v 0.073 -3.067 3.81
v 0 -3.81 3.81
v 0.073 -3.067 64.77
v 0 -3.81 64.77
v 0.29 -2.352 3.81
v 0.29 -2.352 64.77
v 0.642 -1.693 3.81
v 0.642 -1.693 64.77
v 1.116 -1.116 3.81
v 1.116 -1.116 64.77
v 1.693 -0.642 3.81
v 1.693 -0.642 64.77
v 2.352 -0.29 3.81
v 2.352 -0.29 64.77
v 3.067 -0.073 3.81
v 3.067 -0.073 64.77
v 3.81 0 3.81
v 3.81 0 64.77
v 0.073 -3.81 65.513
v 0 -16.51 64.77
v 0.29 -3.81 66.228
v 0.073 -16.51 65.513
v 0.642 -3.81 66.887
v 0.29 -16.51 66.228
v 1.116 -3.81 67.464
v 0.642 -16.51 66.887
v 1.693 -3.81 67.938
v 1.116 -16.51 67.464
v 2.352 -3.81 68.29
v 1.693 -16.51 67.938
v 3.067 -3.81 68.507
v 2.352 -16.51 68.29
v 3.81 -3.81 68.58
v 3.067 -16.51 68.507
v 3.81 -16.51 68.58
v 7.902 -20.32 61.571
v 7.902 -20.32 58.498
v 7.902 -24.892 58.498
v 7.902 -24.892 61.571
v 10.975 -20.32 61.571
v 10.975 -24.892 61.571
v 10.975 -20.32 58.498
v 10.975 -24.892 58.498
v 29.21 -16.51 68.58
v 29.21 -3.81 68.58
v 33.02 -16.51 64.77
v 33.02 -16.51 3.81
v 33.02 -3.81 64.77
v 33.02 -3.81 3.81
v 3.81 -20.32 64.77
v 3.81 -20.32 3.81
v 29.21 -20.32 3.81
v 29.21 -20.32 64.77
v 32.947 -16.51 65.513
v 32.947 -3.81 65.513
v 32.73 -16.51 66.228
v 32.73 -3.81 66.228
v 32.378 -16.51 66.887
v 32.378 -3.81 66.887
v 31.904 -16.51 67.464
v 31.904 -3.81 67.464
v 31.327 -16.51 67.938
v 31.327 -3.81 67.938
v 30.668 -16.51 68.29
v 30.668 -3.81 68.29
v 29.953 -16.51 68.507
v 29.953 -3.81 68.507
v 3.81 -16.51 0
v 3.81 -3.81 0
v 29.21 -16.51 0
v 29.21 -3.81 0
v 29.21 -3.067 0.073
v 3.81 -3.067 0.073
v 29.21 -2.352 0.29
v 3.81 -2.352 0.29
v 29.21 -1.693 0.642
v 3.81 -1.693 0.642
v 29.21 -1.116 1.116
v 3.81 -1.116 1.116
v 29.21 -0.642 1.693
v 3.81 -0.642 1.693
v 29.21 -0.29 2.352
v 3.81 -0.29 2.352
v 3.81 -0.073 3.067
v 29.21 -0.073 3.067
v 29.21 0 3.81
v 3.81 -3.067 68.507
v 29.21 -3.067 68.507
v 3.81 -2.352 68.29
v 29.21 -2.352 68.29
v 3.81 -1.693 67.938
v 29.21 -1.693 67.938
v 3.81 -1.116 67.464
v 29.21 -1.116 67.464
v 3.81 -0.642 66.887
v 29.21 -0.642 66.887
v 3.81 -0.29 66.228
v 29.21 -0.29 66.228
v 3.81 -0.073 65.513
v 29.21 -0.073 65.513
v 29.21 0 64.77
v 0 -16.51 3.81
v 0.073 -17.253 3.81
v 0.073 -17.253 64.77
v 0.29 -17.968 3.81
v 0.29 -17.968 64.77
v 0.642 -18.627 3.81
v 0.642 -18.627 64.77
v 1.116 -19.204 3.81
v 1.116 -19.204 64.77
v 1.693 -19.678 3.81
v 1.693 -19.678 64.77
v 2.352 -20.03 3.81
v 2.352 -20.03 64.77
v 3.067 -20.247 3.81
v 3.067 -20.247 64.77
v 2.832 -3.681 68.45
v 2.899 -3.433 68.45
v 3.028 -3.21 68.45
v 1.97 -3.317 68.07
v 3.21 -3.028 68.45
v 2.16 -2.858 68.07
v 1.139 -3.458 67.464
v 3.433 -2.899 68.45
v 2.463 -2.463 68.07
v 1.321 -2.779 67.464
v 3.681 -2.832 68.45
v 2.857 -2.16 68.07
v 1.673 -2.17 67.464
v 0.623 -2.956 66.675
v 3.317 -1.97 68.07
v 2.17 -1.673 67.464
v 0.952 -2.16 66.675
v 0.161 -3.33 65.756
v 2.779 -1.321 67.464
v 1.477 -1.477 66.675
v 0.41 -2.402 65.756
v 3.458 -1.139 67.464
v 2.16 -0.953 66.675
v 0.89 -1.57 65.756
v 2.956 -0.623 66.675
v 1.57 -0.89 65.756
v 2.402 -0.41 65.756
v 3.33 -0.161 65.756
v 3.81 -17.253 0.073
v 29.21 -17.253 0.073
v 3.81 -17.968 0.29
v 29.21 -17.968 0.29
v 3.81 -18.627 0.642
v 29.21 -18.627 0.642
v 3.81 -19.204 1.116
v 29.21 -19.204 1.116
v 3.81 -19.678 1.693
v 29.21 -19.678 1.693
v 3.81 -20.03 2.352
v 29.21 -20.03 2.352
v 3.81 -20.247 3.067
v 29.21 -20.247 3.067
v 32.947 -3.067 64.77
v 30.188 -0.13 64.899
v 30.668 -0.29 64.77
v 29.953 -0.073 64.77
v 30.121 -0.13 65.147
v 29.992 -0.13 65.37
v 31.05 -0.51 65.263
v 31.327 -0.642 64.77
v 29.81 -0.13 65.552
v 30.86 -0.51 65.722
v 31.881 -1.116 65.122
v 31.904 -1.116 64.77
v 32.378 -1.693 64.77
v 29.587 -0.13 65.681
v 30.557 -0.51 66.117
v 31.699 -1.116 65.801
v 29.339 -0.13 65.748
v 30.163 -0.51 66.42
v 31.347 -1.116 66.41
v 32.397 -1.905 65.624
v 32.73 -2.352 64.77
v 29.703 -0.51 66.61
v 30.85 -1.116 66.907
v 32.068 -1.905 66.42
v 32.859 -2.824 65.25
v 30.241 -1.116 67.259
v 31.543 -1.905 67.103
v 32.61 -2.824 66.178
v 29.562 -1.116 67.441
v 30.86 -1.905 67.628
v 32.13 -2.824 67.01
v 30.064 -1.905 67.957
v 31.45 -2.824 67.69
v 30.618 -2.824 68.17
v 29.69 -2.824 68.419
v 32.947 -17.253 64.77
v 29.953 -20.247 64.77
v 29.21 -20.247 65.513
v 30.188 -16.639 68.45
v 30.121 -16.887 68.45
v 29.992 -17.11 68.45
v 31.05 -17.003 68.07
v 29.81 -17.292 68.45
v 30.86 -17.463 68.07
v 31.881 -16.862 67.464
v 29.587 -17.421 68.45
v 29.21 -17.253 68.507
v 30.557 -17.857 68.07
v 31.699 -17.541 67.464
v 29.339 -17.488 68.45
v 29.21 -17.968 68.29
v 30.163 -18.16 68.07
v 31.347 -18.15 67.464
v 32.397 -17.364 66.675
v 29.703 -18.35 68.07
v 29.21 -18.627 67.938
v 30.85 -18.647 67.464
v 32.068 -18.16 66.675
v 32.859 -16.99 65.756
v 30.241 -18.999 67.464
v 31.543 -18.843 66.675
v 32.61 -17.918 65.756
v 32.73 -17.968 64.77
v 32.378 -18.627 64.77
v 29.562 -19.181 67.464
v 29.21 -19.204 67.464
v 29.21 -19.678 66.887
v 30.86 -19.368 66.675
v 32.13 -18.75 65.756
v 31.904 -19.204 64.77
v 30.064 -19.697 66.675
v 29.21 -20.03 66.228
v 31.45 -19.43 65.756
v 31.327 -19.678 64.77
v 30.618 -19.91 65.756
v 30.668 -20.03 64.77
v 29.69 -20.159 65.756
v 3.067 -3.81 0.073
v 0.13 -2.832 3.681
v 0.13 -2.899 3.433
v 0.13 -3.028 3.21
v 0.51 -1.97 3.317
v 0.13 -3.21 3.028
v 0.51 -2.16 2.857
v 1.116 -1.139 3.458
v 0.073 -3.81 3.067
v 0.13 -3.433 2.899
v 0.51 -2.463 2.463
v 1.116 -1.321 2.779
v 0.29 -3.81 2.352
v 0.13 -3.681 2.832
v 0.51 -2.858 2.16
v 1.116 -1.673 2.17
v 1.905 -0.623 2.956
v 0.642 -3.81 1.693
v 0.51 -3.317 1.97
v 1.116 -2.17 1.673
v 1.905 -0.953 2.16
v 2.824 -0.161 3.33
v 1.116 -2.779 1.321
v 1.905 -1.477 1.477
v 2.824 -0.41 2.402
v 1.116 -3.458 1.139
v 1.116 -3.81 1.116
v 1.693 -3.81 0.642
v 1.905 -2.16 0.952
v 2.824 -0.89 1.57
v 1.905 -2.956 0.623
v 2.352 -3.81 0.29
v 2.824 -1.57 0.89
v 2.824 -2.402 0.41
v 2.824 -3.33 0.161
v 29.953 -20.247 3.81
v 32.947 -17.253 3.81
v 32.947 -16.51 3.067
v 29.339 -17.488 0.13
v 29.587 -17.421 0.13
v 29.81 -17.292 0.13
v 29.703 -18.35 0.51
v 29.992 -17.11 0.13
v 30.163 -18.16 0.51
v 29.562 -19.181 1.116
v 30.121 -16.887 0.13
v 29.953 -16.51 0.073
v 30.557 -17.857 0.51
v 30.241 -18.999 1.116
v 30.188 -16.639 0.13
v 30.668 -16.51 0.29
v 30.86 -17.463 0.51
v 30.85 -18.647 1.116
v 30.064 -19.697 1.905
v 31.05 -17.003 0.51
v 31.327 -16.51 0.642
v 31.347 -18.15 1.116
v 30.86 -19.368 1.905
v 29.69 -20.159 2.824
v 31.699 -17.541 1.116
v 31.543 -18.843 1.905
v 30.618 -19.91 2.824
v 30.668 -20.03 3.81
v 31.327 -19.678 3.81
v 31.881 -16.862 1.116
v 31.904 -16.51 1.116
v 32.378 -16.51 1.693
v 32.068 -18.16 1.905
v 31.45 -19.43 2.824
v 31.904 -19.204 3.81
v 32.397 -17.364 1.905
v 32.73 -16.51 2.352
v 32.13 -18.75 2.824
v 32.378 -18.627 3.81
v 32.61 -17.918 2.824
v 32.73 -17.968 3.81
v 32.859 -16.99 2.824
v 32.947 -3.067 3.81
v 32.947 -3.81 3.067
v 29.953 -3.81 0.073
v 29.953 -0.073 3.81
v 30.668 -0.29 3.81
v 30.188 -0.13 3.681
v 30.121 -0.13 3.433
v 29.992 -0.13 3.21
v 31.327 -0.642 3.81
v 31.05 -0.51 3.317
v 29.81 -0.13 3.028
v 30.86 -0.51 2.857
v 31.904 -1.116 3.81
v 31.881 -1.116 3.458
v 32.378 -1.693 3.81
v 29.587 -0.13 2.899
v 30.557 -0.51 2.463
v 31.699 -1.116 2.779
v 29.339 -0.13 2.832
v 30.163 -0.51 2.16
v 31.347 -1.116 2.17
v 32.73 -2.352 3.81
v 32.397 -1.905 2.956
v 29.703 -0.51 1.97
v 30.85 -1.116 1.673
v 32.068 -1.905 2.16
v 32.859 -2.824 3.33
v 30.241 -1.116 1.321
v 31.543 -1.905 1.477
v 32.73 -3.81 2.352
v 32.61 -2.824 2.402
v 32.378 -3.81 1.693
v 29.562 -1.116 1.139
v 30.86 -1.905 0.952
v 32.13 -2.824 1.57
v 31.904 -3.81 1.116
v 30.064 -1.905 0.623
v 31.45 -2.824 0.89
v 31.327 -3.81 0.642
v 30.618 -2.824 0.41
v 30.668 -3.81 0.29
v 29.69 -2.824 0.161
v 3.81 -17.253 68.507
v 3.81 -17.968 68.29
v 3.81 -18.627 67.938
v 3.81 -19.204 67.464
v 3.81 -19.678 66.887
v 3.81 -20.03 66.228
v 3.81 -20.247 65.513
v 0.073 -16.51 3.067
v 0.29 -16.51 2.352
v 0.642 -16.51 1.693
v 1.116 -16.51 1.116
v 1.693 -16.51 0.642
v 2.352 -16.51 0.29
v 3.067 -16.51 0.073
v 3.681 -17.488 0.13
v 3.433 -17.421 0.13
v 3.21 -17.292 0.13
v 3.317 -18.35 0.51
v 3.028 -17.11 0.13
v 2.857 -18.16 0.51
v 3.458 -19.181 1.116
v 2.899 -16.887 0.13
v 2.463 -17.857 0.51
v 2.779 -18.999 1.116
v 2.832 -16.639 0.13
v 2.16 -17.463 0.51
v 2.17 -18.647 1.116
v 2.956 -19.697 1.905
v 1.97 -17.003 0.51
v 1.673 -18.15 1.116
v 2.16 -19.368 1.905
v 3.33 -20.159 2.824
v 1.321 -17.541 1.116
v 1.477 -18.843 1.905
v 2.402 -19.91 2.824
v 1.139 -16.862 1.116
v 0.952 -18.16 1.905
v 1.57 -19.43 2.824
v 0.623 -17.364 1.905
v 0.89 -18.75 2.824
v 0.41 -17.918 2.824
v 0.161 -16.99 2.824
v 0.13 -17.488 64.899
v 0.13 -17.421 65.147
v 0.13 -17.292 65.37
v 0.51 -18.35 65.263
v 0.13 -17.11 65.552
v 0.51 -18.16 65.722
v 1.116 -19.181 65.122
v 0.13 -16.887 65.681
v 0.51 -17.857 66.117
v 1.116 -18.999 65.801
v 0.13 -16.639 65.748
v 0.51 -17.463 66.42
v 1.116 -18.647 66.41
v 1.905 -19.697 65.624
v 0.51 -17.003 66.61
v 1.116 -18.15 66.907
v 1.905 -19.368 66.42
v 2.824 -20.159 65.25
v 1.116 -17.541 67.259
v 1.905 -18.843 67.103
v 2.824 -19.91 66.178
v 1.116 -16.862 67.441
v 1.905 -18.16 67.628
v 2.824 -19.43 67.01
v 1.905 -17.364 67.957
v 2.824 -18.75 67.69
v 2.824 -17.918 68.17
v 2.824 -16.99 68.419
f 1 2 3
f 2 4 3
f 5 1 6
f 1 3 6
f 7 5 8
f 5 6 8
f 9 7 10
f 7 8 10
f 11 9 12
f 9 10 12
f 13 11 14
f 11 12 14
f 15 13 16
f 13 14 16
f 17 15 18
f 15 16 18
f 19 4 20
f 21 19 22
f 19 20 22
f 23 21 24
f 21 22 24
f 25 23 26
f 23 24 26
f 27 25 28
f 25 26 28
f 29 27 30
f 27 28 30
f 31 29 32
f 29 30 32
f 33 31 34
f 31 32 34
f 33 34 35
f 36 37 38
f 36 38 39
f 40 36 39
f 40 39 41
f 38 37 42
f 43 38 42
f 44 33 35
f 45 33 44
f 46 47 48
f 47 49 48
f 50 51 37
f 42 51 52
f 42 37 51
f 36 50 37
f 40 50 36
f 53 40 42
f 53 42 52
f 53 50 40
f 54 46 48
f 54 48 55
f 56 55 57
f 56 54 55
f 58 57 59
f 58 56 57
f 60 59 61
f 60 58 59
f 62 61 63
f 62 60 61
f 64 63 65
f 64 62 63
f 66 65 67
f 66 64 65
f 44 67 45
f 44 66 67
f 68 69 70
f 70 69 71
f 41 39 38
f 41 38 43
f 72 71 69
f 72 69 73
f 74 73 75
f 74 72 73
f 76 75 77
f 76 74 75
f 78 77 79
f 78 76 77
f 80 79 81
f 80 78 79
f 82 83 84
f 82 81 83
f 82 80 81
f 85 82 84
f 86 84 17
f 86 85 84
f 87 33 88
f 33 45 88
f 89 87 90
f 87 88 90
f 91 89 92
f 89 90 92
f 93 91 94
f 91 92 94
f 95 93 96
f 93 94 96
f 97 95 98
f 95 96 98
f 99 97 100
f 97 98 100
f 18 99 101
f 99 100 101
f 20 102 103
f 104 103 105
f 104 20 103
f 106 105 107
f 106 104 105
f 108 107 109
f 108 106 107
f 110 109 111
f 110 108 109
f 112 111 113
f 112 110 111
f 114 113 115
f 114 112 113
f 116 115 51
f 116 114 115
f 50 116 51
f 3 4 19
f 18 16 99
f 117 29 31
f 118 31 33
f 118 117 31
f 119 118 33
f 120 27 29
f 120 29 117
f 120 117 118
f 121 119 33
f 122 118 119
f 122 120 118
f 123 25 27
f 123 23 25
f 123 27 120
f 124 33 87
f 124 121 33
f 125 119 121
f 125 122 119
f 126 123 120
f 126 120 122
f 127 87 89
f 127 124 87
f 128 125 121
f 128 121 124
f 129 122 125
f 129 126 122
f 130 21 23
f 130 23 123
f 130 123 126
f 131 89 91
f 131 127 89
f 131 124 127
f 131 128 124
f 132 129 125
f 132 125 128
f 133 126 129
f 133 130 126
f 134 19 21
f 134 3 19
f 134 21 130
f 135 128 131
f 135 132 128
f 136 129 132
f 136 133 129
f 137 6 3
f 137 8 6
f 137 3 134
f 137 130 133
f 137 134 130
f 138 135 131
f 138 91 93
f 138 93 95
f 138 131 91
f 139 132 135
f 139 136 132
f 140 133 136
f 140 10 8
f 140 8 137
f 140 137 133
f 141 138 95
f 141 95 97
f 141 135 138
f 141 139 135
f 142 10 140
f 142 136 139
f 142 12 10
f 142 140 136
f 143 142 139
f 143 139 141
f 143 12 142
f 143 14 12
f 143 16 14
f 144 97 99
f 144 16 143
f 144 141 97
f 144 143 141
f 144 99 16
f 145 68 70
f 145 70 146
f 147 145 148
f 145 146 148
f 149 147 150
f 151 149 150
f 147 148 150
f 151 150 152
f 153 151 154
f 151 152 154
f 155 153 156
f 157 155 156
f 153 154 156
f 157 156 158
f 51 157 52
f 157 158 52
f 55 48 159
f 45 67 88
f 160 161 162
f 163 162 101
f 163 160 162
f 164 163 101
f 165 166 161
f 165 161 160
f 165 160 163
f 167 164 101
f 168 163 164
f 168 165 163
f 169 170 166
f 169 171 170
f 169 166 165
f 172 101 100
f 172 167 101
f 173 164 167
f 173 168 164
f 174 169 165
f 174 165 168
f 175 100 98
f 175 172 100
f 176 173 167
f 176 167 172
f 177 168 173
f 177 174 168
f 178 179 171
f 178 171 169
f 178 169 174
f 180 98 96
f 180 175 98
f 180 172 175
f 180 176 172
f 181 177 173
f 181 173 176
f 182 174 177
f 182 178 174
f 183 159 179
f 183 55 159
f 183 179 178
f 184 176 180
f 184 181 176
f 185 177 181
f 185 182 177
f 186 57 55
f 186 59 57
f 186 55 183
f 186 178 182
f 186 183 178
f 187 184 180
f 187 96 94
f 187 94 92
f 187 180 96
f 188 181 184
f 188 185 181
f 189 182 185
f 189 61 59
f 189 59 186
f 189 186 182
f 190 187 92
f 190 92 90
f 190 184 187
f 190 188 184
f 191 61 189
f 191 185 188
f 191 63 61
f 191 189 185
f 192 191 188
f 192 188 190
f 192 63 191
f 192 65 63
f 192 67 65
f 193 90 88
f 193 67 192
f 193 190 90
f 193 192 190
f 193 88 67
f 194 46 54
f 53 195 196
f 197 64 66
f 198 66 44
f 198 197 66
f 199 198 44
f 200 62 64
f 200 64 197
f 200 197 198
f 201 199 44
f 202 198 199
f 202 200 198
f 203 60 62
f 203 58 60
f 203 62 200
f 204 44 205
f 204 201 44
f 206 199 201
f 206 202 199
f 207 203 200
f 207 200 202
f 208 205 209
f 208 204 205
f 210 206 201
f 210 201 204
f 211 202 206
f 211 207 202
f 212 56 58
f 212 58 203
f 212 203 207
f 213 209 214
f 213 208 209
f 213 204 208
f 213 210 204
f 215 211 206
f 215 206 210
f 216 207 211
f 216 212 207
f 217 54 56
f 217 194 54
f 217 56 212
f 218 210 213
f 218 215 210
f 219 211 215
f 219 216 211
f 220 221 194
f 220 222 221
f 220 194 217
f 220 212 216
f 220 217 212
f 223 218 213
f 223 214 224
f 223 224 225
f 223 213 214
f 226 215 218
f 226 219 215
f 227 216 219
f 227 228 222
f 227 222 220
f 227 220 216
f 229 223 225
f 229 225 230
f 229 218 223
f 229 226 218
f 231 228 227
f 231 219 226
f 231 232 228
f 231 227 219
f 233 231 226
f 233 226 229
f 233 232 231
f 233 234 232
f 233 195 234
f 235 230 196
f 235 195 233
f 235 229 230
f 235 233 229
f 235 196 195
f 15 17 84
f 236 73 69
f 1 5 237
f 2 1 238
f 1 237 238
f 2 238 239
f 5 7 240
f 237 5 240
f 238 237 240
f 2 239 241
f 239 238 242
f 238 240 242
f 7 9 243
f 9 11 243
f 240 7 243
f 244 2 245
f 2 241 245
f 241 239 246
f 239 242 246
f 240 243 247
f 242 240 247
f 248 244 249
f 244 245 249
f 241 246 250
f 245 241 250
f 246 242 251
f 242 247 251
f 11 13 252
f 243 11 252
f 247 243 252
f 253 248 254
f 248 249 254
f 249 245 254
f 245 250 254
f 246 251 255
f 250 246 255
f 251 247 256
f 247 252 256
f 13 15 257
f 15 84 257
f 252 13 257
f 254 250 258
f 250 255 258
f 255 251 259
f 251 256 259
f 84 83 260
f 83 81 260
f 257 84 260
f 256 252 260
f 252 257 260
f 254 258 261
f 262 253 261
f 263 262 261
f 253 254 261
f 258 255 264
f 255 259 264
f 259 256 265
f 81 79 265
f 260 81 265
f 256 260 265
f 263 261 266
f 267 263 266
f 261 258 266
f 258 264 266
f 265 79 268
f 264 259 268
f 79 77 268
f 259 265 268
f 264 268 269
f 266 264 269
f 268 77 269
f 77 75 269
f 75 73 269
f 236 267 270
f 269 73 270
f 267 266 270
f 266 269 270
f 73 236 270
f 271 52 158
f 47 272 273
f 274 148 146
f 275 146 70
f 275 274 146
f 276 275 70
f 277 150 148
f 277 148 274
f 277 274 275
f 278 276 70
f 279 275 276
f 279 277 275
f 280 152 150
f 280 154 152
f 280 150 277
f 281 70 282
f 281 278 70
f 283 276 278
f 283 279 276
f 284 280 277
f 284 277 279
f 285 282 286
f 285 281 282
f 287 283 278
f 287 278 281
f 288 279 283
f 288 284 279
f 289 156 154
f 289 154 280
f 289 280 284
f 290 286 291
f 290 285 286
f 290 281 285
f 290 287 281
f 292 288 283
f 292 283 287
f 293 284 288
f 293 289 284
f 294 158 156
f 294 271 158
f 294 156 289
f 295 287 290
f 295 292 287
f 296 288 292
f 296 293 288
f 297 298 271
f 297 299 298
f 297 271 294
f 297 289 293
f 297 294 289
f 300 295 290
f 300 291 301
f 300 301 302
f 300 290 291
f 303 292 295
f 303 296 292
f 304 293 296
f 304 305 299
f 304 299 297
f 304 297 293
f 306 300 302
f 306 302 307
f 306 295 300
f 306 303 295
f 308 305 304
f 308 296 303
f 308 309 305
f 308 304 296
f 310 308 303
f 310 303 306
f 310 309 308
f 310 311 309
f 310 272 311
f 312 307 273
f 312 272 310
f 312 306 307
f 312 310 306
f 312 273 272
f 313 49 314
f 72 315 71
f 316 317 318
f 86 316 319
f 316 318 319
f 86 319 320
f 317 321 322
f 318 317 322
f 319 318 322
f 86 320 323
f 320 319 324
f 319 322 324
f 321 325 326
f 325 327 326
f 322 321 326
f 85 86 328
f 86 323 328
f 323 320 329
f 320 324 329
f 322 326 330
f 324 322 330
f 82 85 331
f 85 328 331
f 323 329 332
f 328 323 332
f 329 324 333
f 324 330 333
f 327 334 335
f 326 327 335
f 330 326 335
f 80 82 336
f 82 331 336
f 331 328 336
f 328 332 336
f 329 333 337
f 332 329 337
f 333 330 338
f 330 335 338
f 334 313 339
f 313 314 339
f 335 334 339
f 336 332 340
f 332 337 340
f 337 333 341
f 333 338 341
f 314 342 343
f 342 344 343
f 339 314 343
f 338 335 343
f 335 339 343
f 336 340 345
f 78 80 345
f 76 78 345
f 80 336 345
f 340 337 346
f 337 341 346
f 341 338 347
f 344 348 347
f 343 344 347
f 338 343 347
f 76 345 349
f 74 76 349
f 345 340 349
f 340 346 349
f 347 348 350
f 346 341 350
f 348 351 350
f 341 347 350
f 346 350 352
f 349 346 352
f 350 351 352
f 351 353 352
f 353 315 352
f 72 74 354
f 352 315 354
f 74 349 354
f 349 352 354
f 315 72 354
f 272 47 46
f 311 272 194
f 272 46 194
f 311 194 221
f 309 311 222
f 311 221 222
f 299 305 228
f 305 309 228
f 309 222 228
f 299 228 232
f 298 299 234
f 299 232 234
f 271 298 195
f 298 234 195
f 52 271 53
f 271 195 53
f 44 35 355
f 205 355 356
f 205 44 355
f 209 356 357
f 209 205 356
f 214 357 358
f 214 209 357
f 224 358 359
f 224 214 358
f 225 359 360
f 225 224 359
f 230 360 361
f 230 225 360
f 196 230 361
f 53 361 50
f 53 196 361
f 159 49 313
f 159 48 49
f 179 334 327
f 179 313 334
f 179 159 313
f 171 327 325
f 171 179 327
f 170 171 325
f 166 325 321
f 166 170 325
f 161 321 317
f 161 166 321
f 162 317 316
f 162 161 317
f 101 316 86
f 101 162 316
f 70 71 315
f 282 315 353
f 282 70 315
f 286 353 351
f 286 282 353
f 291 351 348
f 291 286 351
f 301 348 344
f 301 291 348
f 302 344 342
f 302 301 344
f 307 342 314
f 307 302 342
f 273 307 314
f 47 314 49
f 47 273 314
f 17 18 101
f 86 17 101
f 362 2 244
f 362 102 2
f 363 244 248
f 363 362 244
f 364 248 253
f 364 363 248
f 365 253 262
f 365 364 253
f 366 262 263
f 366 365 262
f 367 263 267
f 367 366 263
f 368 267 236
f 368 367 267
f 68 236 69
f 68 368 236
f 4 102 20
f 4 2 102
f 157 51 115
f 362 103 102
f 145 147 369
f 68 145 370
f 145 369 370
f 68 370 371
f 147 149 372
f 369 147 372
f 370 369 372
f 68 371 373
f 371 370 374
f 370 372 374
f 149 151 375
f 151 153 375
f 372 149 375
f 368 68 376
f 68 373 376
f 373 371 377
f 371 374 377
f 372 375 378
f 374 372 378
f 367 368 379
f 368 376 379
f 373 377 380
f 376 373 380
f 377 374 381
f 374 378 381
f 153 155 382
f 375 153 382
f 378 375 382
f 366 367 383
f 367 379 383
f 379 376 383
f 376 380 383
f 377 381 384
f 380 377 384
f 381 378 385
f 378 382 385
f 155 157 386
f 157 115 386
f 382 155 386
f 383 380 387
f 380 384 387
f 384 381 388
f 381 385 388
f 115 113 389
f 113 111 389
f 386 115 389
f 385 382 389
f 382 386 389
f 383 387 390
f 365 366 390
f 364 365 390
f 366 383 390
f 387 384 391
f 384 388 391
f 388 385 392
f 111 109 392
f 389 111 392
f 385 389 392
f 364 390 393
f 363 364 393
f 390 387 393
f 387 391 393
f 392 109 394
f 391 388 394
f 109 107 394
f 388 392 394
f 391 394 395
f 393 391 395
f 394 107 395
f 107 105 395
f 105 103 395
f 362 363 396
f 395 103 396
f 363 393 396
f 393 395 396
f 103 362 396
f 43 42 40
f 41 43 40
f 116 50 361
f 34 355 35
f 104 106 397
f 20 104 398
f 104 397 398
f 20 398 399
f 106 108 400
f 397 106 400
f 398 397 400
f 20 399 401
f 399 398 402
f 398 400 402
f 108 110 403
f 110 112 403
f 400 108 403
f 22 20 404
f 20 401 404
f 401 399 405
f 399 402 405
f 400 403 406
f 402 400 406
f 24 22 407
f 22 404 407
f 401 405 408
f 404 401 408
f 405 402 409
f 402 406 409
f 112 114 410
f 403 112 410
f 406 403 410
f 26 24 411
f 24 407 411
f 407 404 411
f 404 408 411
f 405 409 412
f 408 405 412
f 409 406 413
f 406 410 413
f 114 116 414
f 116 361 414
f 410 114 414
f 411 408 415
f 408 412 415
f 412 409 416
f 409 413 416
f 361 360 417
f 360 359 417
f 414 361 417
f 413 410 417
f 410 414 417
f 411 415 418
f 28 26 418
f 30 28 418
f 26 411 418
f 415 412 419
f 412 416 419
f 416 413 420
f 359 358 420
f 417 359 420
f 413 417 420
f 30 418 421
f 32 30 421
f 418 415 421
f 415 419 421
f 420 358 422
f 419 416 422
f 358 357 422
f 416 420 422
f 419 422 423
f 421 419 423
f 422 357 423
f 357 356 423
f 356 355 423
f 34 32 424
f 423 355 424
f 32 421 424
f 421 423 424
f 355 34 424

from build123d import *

# Parameters (mm, degrees)
F0_W     = 33.02
F0_H     = 68.58
F1_DEPTH = 20.32
F2_R     = 3.81
F3_W     = 3.073085
F3_H     = 3.073089
F4_DEPTH = 4.572


with BuildPart() as f1:
    # F0 (on Front) → F1 (new body)
    with BuildSketch(Plane.XZ):
        with Locations((16.51, 34.29)):
            Rectangle(F0_W, F0_H)
    extrude(amount=F1_DEPTH)

    # F2
    f2_edges = [f1.edges().sort_by_distance(p)[0] for p in [
        (33.02, -20.32, 34.29),
        (33.02, -10.16, 68.58),
        (16.51, -20.32, 68.58),
        (0, -20.32, 34.29),
        (16.51, -20.32, 0),
        (33.02, -10.16, 0),
        (33.02, 0, 34.29),
        (16.51, 0, 0),
        (0, 0, 34.29),
        (0, -10.16, 68.58),
        (0, -10.16, 0),
        (16.51, 0, 68.58),
    ]]
    fillet(f2_edges, radius=F2_R)

    # F3 (on face) → F4 (join)
    with BuildSketch(Plane.XZ.offset(20.32)):
        with Locations((9.438765, 60.034938)):
            Rectangle(F3_W, F3_H)
    extrude(amount=F4_DEPTH)


solid = f1.part
